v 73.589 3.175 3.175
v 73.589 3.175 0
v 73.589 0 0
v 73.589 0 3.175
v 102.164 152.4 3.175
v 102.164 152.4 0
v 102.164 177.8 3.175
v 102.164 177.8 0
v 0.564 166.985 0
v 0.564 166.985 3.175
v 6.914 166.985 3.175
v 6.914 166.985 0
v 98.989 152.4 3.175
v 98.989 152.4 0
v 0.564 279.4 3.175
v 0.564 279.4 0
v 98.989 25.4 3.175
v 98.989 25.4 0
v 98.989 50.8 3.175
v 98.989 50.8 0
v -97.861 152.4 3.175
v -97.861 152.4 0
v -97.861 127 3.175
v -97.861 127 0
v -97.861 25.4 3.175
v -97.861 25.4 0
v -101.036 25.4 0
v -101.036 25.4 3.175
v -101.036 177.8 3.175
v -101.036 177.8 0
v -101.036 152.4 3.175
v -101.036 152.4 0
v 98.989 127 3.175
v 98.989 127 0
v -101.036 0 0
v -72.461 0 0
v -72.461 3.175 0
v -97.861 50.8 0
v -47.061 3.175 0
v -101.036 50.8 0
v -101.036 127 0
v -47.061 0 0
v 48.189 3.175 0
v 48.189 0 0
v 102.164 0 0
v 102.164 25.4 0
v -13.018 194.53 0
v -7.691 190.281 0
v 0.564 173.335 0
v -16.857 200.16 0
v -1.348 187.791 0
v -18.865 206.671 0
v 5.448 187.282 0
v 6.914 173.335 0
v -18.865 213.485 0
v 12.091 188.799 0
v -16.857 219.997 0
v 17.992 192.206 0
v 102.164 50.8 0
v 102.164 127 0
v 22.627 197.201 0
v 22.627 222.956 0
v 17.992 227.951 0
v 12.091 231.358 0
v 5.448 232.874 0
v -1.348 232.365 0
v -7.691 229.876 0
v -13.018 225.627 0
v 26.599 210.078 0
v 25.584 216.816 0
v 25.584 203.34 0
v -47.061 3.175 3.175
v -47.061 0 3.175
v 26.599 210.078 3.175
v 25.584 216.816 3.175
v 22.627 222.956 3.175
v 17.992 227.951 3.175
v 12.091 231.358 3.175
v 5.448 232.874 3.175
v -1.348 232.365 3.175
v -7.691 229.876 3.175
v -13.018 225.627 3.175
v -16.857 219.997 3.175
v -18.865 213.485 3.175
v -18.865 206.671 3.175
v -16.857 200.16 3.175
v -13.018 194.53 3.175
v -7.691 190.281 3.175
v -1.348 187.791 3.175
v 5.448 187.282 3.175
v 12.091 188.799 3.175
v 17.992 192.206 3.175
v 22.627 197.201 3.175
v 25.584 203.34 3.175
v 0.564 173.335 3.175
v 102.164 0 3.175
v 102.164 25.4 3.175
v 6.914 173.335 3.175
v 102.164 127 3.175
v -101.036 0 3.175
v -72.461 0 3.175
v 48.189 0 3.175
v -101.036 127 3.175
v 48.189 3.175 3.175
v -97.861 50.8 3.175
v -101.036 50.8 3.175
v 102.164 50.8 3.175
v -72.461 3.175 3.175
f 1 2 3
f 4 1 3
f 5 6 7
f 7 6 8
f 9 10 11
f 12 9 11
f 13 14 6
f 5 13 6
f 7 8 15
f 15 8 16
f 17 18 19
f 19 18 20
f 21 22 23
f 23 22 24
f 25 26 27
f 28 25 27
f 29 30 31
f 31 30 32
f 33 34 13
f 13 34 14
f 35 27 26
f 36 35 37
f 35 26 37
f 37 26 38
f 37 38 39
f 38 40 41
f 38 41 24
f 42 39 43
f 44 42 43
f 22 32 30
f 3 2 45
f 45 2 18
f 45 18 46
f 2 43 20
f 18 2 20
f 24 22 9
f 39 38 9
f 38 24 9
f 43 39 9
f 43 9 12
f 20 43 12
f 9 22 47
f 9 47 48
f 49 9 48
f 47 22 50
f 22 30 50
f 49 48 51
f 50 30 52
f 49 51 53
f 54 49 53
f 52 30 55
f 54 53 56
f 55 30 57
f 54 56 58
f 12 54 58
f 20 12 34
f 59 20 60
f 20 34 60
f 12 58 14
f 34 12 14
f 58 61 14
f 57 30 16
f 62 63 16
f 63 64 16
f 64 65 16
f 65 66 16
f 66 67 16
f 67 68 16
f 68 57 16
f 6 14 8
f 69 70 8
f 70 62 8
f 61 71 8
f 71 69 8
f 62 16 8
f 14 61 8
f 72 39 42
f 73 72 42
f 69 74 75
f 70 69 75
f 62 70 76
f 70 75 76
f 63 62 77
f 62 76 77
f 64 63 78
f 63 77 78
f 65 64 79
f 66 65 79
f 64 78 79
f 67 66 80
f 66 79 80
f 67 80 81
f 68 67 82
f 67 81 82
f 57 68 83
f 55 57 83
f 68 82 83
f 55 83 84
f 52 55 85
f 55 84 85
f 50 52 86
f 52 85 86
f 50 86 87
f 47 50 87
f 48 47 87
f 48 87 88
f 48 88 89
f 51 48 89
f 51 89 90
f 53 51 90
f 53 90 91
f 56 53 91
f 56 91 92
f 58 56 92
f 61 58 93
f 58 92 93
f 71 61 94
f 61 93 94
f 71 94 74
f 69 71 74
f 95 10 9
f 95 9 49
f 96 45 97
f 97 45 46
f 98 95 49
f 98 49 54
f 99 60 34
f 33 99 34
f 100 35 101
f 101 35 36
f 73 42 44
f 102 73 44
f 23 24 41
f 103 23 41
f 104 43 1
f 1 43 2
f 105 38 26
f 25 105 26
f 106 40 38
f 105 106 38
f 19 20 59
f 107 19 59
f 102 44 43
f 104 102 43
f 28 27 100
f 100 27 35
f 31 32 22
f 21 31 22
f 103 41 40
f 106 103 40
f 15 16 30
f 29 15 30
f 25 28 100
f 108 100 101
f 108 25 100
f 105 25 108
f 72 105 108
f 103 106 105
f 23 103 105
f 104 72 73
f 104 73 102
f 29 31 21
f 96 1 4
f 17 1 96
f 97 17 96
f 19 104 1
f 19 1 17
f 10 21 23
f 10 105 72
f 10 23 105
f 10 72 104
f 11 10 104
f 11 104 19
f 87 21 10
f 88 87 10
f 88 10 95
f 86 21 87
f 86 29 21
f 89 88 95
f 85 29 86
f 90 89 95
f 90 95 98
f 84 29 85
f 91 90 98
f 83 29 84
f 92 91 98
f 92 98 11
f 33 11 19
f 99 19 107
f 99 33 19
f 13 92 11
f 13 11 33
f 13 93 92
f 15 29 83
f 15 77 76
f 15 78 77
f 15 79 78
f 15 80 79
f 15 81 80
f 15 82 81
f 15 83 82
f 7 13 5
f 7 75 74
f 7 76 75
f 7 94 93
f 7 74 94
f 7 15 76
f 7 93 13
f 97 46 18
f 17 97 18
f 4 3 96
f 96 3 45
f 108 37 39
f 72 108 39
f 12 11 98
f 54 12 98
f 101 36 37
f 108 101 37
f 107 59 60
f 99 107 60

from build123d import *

# Parameters (mm, degrees)
BOSS_EXTRUDE1_DEPTH = 3.175
SKETCH3_R           = 22.86
CUT_EXTRUDE1_DEPTH  = 3.175
SKETCH5_W           = 6.35
SKETCH5_H           = 6.35
CUT_EXTRUDE2_DEPTH  = 3.175


with BuildPart() as part:
    # Sketch2 → Boss-Extrude1 (new body)
    with BuildSketch(Plane.XY):
        Polygon((0.564315933, 279.4), (-101.035684067, 177.8), (-101.035684067, 152.4), (-97.860684067, 152.4), (-97.860684067, 127), (-101.035684067, 127), (-101.035684067, 50.8), (-97.860684067, 50.8), (-97.860684067, 25.4), (-101.035684067, 25.4), (-101.035684067, 0), (-72.460684067, 0), (-72.460684067, 3.175), (-47.060684067, 3.175), (-47.060684067, 0), (48.189315933, 0), (48.189315933, 3.175), (73.589315933, 3.175), (73.589315933, 0), (102.164315933, 0), (102.164315933, 25.4), (98.989315933, 25.4), (98.989315933, 50.8), (102.164315933, 50.8), (102.164315933, 127), (98.989315933, 127), (98.989315933, 152.4), (102.164315933, 152.4), (102.164315933, 177.8), align=None)
    extrude(amount=BOSS_EXTRUDE1_DEPTH)

    # Sketch3 → Cut-Extrude1 (cut)
    with BuildSketch(Plane.XY.offset(3.175)):
        with Locations((3.739315933, 210.078311119)):
            Circle(SKETCH3_R)
    extrude(amount=-CUT_EXTRUDE1_DEPTH, mode=Mode.SUBTRACT)

    # Sketch5 → Cut-Extrude2 (cut)
    with BuildSketch(Plane.XY.offset(3.175)):
        with Locations((3.739315933, 170.159778504)):
            Rectangle(SKETCH5_W, SKETCH5_H)
    extrude(amount=-CUT_EXTRUDE2_DEPTH, mode=Mode.SUBTRACT)


solid = part.part
